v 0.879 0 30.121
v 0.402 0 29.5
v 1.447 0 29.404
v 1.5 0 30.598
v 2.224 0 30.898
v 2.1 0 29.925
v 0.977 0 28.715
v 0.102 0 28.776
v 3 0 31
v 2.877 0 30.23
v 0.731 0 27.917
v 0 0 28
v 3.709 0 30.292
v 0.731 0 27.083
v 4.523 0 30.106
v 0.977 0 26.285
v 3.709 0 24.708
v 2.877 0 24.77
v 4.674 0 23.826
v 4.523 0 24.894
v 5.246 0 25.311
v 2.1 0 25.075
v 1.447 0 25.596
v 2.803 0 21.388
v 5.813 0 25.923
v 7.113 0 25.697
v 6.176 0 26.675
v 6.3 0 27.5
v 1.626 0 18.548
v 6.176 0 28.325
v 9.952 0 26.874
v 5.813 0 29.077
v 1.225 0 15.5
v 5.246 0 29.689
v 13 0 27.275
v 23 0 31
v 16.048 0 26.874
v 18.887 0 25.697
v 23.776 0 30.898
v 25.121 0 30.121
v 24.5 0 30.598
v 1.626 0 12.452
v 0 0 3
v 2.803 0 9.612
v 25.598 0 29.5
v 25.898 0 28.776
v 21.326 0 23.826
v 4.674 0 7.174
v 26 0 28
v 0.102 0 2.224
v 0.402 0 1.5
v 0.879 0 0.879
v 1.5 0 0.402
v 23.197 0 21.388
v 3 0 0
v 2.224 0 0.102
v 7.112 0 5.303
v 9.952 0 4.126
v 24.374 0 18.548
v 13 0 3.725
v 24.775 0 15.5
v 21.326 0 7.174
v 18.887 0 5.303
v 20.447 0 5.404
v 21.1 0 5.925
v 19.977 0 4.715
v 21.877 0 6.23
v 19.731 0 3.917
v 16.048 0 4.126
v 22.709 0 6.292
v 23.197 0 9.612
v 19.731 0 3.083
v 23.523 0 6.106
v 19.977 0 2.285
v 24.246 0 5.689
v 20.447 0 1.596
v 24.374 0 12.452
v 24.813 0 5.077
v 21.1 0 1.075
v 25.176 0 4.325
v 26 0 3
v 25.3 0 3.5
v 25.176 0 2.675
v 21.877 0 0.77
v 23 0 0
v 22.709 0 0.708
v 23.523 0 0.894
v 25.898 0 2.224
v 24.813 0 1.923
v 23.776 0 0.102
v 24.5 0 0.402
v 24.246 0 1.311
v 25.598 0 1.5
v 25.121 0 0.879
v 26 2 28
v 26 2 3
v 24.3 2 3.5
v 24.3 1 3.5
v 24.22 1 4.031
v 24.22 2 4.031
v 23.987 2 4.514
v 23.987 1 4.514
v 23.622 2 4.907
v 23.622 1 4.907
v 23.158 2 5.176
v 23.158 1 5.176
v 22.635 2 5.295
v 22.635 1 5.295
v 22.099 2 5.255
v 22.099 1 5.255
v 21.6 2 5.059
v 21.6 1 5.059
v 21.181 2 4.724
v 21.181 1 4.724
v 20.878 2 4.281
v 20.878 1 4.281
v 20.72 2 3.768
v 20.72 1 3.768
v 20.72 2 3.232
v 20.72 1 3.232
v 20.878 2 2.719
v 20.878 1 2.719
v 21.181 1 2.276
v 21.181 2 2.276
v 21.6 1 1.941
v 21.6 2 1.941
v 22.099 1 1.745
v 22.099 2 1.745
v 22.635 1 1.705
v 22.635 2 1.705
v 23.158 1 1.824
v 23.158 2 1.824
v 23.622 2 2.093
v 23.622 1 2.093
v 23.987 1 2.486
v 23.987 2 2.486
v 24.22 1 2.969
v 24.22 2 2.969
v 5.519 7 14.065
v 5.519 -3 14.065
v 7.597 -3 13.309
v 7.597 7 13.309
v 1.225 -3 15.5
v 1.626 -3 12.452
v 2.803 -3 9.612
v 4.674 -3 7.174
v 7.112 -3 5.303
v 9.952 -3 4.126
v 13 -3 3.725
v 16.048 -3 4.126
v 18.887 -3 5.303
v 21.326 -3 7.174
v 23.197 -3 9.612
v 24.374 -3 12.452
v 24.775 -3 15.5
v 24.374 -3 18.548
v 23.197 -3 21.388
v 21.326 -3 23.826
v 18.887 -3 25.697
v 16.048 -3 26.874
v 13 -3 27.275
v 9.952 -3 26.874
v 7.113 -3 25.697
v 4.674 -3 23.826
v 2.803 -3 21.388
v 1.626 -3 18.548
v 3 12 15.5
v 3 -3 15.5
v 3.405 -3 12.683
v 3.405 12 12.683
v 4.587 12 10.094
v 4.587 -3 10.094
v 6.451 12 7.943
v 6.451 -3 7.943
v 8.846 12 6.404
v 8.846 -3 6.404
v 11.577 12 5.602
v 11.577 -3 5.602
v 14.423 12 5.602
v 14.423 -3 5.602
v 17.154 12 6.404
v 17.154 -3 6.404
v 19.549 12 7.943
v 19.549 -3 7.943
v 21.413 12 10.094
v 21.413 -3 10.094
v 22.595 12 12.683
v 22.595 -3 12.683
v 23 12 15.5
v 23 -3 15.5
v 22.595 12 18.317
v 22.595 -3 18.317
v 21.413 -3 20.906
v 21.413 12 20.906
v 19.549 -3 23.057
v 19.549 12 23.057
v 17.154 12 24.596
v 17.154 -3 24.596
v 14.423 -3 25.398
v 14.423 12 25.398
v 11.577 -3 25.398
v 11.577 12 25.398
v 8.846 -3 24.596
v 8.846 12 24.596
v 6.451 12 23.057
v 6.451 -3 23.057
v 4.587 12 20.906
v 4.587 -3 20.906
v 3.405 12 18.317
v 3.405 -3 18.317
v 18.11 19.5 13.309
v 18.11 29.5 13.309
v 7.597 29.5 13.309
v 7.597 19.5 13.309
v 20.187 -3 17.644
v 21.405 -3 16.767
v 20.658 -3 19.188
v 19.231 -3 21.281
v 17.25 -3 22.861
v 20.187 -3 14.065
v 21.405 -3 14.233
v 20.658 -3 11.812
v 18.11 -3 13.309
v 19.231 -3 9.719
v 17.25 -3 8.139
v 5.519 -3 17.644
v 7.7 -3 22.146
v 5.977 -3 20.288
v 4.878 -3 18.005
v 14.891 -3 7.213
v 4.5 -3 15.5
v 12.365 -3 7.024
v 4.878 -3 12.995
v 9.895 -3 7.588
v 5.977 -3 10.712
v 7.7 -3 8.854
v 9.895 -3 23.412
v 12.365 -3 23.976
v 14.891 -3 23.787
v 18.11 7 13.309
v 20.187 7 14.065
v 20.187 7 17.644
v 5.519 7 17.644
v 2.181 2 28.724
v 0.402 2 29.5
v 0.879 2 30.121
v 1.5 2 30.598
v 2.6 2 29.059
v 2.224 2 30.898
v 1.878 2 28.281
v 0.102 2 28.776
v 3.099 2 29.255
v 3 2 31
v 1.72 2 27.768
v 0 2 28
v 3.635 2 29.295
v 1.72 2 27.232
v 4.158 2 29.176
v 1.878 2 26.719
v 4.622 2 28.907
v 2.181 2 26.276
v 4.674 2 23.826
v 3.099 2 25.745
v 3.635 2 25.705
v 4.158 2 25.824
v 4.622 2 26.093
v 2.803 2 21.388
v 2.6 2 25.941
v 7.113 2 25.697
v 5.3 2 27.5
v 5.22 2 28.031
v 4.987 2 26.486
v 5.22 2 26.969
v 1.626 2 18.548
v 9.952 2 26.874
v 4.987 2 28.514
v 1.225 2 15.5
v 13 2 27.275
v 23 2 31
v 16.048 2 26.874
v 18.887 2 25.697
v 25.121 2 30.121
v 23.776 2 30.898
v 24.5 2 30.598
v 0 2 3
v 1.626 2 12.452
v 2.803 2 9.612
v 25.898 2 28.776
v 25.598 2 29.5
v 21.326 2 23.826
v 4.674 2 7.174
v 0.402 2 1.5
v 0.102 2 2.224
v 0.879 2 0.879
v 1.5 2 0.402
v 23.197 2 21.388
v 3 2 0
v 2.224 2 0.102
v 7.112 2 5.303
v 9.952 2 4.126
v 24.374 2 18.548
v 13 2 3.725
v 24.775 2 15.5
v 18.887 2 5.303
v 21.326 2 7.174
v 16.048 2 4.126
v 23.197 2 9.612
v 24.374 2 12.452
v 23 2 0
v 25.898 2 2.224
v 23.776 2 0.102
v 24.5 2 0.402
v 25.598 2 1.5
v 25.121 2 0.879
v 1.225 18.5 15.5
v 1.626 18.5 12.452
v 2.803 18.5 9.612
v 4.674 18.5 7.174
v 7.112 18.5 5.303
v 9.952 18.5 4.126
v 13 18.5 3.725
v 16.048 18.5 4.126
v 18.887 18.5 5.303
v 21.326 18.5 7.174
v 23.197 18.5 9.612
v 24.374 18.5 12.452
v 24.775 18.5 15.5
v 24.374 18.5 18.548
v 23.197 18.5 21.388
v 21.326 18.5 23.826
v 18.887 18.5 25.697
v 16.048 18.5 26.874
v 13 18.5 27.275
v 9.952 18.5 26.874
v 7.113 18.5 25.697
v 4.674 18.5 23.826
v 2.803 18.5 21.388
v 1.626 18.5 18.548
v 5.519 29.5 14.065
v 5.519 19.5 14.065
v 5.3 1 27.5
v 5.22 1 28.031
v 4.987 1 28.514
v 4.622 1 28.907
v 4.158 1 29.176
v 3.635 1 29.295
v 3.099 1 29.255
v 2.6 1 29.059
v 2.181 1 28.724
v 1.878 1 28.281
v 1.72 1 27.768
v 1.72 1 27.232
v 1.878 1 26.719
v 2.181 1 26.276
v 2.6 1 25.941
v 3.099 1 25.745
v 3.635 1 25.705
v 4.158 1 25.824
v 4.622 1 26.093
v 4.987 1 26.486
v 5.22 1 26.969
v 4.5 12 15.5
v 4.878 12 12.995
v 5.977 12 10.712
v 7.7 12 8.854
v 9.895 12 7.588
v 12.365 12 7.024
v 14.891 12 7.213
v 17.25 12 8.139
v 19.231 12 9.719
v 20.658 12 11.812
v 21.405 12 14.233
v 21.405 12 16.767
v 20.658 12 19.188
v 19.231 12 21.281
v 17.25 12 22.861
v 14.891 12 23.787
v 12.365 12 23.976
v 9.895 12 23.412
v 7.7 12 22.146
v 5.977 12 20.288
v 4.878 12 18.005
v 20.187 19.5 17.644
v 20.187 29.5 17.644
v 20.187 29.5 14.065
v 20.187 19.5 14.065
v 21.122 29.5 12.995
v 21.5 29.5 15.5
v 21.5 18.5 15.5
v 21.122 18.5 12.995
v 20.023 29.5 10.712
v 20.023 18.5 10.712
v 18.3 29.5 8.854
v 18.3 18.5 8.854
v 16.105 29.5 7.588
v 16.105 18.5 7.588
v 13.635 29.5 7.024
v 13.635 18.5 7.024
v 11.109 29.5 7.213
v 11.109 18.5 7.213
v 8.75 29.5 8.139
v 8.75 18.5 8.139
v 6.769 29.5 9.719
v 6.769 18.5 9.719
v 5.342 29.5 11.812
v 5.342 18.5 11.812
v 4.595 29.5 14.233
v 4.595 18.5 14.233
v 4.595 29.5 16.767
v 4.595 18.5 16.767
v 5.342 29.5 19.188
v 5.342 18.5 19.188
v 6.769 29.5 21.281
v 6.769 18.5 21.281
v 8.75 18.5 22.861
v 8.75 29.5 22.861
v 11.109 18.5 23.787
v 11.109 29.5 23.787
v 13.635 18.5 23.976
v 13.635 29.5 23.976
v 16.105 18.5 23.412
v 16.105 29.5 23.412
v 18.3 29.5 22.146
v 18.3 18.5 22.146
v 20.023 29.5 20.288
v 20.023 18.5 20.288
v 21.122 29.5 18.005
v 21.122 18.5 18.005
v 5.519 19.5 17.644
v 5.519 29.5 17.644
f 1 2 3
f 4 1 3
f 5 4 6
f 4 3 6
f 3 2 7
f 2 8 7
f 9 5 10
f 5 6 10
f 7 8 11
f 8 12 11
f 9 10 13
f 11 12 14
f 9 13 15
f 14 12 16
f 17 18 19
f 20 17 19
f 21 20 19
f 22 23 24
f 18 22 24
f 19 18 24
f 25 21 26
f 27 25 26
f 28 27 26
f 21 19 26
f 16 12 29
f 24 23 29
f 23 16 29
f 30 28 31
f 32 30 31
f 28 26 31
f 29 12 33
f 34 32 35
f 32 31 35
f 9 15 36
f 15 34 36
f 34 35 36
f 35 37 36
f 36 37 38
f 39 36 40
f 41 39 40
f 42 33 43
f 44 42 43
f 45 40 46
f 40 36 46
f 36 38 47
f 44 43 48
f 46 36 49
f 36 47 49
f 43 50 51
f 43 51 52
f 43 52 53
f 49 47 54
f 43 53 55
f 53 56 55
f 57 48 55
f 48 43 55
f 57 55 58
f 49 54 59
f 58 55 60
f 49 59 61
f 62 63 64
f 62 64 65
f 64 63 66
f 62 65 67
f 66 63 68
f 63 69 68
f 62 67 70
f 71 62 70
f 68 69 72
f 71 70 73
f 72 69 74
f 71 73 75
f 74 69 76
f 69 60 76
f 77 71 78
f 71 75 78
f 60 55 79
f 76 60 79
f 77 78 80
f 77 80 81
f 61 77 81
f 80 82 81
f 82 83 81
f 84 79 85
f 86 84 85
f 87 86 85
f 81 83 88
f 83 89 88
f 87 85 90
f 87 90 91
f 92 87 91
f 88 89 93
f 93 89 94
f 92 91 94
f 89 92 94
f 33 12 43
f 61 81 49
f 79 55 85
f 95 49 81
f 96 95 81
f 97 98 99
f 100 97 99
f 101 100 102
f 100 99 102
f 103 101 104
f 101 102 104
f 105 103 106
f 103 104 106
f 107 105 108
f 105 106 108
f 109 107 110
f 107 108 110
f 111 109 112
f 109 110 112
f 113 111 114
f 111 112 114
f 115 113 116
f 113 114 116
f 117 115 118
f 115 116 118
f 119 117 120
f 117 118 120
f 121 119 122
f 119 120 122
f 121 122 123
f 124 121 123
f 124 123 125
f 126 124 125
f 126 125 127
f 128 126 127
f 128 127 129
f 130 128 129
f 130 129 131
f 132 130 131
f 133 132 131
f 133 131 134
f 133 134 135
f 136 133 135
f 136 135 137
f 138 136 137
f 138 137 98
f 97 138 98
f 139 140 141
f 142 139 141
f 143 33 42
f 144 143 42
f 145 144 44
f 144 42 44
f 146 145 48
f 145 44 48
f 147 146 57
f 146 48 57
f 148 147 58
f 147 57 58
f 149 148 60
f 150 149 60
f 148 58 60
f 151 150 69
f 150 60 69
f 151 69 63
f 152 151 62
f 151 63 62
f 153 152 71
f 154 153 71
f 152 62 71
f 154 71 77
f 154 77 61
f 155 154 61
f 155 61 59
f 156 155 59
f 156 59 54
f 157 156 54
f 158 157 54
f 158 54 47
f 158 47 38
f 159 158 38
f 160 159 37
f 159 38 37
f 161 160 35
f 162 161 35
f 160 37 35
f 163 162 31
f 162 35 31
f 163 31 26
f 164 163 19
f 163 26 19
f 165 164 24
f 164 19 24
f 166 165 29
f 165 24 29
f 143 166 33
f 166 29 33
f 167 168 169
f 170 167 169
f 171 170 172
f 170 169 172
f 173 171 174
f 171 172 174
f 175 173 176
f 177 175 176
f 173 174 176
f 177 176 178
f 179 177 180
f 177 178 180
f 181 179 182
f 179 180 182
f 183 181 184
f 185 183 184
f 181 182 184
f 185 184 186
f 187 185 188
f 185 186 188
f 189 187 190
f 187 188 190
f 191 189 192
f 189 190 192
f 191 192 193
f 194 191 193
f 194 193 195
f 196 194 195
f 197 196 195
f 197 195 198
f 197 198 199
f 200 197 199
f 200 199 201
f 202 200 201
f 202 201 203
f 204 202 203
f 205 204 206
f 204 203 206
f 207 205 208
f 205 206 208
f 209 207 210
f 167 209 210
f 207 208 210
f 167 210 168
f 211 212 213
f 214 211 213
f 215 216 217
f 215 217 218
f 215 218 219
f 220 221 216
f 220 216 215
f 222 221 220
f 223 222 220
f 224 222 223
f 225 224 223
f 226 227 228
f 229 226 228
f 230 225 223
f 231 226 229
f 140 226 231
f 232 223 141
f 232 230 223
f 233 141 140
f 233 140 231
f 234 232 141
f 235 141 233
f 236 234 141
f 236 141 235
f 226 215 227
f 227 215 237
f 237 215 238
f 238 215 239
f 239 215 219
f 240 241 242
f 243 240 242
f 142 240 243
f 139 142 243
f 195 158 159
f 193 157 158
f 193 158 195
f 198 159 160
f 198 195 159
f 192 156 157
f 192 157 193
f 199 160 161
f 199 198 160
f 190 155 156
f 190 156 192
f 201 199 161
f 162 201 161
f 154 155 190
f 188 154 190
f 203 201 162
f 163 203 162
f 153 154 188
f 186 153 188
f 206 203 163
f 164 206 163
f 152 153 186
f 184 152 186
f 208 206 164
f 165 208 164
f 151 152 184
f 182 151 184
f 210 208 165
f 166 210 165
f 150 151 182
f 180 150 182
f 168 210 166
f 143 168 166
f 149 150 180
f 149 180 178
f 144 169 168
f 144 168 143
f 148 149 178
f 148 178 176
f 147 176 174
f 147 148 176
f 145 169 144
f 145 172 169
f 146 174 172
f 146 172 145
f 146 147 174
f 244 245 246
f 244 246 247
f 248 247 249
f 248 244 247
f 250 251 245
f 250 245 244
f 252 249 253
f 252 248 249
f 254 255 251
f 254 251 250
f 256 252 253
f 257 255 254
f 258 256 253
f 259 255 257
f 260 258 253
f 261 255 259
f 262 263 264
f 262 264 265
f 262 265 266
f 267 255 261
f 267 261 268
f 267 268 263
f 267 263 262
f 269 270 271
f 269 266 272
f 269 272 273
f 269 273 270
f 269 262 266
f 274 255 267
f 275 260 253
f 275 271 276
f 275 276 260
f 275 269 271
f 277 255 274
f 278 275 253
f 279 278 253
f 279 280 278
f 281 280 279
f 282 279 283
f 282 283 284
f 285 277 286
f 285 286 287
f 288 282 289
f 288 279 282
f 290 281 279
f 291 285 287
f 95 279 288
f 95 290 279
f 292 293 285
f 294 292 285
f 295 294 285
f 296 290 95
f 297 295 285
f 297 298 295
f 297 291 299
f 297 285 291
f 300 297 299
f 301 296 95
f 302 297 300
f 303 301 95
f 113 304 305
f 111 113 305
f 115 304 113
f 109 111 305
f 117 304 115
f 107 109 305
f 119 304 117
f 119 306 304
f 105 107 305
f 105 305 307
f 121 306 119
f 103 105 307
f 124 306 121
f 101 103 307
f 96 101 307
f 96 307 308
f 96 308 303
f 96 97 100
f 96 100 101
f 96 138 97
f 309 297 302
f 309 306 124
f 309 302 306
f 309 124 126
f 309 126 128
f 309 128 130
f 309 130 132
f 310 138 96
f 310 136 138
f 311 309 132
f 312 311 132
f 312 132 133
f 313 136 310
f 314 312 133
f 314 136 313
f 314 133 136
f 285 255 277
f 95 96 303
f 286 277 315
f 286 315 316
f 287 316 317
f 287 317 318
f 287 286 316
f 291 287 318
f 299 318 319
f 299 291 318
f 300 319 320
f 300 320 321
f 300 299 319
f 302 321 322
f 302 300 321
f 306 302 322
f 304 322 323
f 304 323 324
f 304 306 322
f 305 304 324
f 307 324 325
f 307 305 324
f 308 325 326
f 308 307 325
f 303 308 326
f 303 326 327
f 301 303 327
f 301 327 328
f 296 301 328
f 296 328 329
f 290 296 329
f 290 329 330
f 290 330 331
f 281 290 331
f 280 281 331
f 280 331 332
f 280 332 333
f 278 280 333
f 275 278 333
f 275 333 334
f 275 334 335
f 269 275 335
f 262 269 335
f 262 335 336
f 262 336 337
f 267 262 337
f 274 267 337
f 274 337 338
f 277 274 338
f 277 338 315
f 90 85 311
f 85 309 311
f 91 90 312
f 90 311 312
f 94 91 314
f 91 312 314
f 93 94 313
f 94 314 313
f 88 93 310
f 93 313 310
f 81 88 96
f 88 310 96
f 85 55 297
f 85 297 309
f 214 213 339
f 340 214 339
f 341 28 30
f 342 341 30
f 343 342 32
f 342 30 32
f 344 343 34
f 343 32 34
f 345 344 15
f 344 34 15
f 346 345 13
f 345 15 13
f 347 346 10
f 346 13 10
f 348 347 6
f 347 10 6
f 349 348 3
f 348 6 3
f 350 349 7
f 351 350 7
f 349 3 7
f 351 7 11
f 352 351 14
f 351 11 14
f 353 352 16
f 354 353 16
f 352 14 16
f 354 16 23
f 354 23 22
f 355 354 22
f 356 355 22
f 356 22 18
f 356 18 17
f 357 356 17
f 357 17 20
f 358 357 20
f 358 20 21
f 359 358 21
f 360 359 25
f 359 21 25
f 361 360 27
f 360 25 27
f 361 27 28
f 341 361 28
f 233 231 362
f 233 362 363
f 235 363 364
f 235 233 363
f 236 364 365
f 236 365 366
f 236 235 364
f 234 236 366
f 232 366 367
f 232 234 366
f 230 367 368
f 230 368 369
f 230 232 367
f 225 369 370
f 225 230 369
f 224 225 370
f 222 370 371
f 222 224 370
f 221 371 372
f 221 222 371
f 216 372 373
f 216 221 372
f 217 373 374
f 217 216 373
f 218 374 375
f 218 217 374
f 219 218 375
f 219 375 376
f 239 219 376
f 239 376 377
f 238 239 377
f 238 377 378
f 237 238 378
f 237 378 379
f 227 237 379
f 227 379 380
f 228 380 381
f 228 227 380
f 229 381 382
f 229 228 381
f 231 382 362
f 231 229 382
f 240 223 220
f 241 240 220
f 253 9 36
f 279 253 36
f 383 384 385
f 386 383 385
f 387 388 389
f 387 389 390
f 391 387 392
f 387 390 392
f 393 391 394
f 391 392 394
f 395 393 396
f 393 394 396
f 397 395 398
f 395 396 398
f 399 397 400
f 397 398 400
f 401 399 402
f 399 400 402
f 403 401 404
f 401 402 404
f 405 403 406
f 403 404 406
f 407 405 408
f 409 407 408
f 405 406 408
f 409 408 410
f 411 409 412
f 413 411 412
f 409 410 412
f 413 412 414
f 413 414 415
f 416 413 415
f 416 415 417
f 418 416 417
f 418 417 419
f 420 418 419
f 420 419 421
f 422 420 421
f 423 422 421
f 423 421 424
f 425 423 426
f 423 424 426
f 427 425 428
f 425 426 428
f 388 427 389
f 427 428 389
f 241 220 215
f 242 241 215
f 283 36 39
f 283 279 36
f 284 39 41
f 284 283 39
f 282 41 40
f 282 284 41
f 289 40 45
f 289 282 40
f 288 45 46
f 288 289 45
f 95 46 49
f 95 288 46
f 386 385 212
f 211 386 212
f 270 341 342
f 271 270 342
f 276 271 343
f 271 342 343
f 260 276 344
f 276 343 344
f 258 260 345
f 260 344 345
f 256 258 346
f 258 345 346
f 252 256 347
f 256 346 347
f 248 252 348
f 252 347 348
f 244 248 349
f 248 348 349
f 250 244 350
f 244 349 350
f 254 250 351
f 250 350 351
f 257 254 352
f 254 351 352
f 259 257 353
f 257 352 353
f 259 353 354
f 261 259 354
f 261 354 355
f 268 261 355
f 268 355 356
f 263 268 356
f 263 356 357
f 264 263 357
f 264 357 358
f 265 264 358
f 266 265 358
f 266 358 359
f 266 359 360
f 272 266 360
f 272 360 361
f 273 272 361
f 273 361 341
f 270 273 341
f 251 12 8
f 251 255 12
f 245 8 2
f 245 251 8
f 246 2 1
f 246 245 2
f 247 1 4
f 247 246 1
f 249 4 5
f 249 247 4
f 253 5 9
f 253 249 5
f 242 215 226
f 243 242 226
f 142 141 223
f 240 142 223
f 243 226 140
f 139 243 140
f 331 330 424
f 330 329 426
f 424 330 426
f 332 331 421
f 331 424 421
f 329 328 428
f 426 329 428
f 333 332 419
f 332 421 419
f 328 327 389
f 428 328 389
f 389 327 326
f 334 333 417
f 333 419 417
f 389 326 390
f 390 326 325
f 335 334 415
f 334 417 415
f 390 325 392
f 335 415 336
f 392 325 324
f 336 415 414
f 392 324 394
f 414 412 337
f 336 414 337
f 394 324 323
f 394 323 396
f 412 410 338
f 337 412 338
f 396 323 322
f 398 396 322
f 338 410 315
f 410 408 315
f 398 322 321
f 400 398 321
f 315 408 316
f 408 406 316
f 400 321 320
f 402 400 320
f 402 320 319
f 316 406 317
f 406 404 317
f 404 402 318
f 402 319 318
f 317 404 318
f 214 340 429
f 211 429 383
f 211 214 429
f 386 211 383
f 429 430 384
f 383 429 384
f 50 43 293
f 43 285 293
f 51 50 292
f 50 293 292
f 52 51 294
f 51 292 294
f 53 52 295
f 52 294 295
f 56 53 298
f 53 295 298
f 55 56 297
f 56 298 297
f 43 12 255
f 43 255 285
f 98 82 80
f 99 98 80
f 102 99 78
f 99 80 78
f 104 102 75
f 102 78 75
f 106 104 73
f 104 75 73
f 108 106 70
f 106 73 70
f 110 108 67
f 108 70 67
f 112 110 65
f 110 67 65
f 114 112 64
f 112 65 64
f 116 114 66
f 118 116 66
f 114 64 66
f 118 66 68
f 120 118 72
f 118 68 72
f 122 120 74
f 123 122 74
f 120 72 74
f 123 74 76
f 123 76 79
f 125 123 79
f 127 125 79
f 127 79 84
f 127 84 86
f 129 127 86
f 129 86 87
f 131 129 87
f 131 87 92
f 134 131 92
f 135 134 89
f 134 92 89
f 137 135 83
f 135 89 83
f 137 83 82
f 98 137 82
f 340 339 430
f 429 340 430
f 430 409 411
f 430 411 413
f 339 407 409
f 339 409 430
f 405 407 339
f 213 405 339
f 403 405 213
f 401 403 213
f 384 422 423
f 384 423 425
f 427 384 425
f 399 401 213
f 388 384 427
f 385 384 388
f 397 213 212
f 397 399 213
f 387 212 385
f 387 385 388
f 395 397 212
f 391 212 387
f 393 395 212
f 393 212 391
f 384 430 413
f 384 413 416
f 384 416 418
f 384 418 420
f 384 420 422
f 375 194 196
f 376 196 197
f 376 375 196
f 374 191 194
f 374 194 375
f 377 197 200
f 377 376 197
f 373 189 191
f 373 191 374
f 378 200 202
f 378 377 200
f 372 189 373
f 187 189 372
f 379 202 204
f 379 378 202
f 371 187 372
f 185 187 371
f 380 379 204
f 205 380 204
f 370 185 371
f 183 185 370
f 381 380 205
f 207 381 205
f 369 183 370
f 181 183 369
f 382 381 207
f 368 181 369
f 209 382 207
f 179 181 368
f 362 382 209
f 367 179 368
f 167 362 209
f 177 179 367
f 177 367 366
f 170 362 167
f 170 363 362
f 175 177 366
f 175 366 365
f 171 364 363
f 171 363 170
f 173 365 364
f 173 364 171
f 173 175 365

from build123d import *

# Parameters (mm, degrees)
SKETCH1_W           = 26
SKETCH1_H           = 31
EXTRUDE1_DEPTH      = 2
SKETCH2_R           = 11.775
EXTRUDE2_DEPTH      = 3
EXTRUDE2_DEPTH_BACK = 18.5
SKETCH3_R           = 8.5
EXTRUDE3_DEPTH      = 11
SKETCH4_R           = 10
SKETCH4_R_2         = 8.5
EXTRUDE4_DEPTH      = 15
EXTRUDE5_DEPTH      = 10
SKETCH9_R           = 1.8
EXTRUDE6_DEPTH      = 10
CHAMFER1_SIZE       = 1
FILLET1_R           = 3
EXTRUDE7_DEPTH      = 10


with BuildPart() as part:
    # Sketch1 → Extrude1 (new body)
    with BuildSketch(Plane(origin=(0, 0, 0), x_dir=(1, 0, 0), z_dir=(0, 1, 0))):
        with Locations((13, -15.5)):
            Rectangle(SKETCH1_W, SKETCH1_H)
    extrude(amount=EXTRUDE1_DEPTH)

    # Sketch2 → Extrude2 (add, two sides)
    with BuildSketch(Plane(origin=(0, 0, 0), x_dir=(-1, 0, 0), z_dir=(0, -1, 0))) as extrude2_sk:
        with Locations((-13, -15.5)):
            Circle(SKETCH2_R)
    extrude(amount=EXTRUDE2_DEPTH)
    extrude(extrude2_sk.sketch, amount=-EXTRUDE2_DEPTH_BACK)

    # Sketch3 → Extrude3 (add)
    with BuildSketch(Plane(origin=(0, 18.5, 0), x_dir=(1, 0, 0), z_dir=(0, 1, 0))):
        with Locations((13, -15.5)):
            Circle(SKETCH3_R)
    extrude(amount=EXTRUDE3_DEPTH)

    # Sketch4 → Extrude4 (cut)
    with BuildSketch(Plane(origin=(0, -3, 0), x_dir=(-1, 0, 0), z_dir=(0, -1, 0))):
        with Locations((-13, -15.5)):
            Circle(SKETCH4_R)
        with Locations((-13, -15.5)):
            Circle(SKETCH4_R_2, mode=Mode.SUBTRACT)
    extrude(amount=-EXTRUDE4_DEPTH, mode=Mode.SUBTRACT)

    # Sketch5 → Extrude5 (cut)
    with BuildSketch(Plane(origin=(0, -3, 0), x_dir=(-1, 0, 0), z_dir=(0, -1, 0))):
        Polygon((-5.519295113, -14.065487649), (-7.596667184, -13.309386049), (-18.109711193, -13.309386049), (-20.187083264, -14.065487649), (-20.187083264, -17.643859967), (-5.519295113, -17.643859967), align=None)
    extrude(amount=-EXTRUDE5_DEPTH, mode=Mode.SUBTRACT)

    # Sketch9 → Extrude6 (cut)
    with BuildSketch(Plane.XZ):
        with Locations((3.5, 27.5)):
            Circle(SKETCH9_R)
        with Locations((22.5, 3.5)):
            Circle(SKETCH9_R)
    extrude(amount=-EXTRUDE6_DEPTH, mode=Mode.SUBTRACT)

    # Chamfer1
    chamfer1_edges = [part.edges().sort_by_distance(p)[0] for p in [
        (1.7, 0, 27.5),
        (20.7, 0, 3.5),
    ]]
    chamfer(chamfer1_edges, length=CHAMFER1_SIZE)

    # Fillet1
    fillet1_edges = [part.edges().sort_by_distance(p)[0] for p in [
        (0, 1, 0),
        (26, 1, 0),
        (26, 1, 31),
        (0, 1, 31),
    ]]
    fillet(fillet1_edges, radius=FILLET1_R)

    # Sketch10 → Extrude7 (cut)
    with BuildSketch(Plane(origin=(0, 29.5, 0), x_dir=(1, 0, 0), z_dir=(0, 1, 0))):
        Polygon((5.519295113, -14.065487649), (5.519295113, -17.643859967), (20.187083264, -17.643859967), (20.187083264, -14.065487649), (18.109711193, -13.309386049), (7.596667184, -13.309386049), align=None)
    extrude(amount=-EXTRUDE7_DEPTH, mode=Mode.SUBTRACT)


solid = part.part
